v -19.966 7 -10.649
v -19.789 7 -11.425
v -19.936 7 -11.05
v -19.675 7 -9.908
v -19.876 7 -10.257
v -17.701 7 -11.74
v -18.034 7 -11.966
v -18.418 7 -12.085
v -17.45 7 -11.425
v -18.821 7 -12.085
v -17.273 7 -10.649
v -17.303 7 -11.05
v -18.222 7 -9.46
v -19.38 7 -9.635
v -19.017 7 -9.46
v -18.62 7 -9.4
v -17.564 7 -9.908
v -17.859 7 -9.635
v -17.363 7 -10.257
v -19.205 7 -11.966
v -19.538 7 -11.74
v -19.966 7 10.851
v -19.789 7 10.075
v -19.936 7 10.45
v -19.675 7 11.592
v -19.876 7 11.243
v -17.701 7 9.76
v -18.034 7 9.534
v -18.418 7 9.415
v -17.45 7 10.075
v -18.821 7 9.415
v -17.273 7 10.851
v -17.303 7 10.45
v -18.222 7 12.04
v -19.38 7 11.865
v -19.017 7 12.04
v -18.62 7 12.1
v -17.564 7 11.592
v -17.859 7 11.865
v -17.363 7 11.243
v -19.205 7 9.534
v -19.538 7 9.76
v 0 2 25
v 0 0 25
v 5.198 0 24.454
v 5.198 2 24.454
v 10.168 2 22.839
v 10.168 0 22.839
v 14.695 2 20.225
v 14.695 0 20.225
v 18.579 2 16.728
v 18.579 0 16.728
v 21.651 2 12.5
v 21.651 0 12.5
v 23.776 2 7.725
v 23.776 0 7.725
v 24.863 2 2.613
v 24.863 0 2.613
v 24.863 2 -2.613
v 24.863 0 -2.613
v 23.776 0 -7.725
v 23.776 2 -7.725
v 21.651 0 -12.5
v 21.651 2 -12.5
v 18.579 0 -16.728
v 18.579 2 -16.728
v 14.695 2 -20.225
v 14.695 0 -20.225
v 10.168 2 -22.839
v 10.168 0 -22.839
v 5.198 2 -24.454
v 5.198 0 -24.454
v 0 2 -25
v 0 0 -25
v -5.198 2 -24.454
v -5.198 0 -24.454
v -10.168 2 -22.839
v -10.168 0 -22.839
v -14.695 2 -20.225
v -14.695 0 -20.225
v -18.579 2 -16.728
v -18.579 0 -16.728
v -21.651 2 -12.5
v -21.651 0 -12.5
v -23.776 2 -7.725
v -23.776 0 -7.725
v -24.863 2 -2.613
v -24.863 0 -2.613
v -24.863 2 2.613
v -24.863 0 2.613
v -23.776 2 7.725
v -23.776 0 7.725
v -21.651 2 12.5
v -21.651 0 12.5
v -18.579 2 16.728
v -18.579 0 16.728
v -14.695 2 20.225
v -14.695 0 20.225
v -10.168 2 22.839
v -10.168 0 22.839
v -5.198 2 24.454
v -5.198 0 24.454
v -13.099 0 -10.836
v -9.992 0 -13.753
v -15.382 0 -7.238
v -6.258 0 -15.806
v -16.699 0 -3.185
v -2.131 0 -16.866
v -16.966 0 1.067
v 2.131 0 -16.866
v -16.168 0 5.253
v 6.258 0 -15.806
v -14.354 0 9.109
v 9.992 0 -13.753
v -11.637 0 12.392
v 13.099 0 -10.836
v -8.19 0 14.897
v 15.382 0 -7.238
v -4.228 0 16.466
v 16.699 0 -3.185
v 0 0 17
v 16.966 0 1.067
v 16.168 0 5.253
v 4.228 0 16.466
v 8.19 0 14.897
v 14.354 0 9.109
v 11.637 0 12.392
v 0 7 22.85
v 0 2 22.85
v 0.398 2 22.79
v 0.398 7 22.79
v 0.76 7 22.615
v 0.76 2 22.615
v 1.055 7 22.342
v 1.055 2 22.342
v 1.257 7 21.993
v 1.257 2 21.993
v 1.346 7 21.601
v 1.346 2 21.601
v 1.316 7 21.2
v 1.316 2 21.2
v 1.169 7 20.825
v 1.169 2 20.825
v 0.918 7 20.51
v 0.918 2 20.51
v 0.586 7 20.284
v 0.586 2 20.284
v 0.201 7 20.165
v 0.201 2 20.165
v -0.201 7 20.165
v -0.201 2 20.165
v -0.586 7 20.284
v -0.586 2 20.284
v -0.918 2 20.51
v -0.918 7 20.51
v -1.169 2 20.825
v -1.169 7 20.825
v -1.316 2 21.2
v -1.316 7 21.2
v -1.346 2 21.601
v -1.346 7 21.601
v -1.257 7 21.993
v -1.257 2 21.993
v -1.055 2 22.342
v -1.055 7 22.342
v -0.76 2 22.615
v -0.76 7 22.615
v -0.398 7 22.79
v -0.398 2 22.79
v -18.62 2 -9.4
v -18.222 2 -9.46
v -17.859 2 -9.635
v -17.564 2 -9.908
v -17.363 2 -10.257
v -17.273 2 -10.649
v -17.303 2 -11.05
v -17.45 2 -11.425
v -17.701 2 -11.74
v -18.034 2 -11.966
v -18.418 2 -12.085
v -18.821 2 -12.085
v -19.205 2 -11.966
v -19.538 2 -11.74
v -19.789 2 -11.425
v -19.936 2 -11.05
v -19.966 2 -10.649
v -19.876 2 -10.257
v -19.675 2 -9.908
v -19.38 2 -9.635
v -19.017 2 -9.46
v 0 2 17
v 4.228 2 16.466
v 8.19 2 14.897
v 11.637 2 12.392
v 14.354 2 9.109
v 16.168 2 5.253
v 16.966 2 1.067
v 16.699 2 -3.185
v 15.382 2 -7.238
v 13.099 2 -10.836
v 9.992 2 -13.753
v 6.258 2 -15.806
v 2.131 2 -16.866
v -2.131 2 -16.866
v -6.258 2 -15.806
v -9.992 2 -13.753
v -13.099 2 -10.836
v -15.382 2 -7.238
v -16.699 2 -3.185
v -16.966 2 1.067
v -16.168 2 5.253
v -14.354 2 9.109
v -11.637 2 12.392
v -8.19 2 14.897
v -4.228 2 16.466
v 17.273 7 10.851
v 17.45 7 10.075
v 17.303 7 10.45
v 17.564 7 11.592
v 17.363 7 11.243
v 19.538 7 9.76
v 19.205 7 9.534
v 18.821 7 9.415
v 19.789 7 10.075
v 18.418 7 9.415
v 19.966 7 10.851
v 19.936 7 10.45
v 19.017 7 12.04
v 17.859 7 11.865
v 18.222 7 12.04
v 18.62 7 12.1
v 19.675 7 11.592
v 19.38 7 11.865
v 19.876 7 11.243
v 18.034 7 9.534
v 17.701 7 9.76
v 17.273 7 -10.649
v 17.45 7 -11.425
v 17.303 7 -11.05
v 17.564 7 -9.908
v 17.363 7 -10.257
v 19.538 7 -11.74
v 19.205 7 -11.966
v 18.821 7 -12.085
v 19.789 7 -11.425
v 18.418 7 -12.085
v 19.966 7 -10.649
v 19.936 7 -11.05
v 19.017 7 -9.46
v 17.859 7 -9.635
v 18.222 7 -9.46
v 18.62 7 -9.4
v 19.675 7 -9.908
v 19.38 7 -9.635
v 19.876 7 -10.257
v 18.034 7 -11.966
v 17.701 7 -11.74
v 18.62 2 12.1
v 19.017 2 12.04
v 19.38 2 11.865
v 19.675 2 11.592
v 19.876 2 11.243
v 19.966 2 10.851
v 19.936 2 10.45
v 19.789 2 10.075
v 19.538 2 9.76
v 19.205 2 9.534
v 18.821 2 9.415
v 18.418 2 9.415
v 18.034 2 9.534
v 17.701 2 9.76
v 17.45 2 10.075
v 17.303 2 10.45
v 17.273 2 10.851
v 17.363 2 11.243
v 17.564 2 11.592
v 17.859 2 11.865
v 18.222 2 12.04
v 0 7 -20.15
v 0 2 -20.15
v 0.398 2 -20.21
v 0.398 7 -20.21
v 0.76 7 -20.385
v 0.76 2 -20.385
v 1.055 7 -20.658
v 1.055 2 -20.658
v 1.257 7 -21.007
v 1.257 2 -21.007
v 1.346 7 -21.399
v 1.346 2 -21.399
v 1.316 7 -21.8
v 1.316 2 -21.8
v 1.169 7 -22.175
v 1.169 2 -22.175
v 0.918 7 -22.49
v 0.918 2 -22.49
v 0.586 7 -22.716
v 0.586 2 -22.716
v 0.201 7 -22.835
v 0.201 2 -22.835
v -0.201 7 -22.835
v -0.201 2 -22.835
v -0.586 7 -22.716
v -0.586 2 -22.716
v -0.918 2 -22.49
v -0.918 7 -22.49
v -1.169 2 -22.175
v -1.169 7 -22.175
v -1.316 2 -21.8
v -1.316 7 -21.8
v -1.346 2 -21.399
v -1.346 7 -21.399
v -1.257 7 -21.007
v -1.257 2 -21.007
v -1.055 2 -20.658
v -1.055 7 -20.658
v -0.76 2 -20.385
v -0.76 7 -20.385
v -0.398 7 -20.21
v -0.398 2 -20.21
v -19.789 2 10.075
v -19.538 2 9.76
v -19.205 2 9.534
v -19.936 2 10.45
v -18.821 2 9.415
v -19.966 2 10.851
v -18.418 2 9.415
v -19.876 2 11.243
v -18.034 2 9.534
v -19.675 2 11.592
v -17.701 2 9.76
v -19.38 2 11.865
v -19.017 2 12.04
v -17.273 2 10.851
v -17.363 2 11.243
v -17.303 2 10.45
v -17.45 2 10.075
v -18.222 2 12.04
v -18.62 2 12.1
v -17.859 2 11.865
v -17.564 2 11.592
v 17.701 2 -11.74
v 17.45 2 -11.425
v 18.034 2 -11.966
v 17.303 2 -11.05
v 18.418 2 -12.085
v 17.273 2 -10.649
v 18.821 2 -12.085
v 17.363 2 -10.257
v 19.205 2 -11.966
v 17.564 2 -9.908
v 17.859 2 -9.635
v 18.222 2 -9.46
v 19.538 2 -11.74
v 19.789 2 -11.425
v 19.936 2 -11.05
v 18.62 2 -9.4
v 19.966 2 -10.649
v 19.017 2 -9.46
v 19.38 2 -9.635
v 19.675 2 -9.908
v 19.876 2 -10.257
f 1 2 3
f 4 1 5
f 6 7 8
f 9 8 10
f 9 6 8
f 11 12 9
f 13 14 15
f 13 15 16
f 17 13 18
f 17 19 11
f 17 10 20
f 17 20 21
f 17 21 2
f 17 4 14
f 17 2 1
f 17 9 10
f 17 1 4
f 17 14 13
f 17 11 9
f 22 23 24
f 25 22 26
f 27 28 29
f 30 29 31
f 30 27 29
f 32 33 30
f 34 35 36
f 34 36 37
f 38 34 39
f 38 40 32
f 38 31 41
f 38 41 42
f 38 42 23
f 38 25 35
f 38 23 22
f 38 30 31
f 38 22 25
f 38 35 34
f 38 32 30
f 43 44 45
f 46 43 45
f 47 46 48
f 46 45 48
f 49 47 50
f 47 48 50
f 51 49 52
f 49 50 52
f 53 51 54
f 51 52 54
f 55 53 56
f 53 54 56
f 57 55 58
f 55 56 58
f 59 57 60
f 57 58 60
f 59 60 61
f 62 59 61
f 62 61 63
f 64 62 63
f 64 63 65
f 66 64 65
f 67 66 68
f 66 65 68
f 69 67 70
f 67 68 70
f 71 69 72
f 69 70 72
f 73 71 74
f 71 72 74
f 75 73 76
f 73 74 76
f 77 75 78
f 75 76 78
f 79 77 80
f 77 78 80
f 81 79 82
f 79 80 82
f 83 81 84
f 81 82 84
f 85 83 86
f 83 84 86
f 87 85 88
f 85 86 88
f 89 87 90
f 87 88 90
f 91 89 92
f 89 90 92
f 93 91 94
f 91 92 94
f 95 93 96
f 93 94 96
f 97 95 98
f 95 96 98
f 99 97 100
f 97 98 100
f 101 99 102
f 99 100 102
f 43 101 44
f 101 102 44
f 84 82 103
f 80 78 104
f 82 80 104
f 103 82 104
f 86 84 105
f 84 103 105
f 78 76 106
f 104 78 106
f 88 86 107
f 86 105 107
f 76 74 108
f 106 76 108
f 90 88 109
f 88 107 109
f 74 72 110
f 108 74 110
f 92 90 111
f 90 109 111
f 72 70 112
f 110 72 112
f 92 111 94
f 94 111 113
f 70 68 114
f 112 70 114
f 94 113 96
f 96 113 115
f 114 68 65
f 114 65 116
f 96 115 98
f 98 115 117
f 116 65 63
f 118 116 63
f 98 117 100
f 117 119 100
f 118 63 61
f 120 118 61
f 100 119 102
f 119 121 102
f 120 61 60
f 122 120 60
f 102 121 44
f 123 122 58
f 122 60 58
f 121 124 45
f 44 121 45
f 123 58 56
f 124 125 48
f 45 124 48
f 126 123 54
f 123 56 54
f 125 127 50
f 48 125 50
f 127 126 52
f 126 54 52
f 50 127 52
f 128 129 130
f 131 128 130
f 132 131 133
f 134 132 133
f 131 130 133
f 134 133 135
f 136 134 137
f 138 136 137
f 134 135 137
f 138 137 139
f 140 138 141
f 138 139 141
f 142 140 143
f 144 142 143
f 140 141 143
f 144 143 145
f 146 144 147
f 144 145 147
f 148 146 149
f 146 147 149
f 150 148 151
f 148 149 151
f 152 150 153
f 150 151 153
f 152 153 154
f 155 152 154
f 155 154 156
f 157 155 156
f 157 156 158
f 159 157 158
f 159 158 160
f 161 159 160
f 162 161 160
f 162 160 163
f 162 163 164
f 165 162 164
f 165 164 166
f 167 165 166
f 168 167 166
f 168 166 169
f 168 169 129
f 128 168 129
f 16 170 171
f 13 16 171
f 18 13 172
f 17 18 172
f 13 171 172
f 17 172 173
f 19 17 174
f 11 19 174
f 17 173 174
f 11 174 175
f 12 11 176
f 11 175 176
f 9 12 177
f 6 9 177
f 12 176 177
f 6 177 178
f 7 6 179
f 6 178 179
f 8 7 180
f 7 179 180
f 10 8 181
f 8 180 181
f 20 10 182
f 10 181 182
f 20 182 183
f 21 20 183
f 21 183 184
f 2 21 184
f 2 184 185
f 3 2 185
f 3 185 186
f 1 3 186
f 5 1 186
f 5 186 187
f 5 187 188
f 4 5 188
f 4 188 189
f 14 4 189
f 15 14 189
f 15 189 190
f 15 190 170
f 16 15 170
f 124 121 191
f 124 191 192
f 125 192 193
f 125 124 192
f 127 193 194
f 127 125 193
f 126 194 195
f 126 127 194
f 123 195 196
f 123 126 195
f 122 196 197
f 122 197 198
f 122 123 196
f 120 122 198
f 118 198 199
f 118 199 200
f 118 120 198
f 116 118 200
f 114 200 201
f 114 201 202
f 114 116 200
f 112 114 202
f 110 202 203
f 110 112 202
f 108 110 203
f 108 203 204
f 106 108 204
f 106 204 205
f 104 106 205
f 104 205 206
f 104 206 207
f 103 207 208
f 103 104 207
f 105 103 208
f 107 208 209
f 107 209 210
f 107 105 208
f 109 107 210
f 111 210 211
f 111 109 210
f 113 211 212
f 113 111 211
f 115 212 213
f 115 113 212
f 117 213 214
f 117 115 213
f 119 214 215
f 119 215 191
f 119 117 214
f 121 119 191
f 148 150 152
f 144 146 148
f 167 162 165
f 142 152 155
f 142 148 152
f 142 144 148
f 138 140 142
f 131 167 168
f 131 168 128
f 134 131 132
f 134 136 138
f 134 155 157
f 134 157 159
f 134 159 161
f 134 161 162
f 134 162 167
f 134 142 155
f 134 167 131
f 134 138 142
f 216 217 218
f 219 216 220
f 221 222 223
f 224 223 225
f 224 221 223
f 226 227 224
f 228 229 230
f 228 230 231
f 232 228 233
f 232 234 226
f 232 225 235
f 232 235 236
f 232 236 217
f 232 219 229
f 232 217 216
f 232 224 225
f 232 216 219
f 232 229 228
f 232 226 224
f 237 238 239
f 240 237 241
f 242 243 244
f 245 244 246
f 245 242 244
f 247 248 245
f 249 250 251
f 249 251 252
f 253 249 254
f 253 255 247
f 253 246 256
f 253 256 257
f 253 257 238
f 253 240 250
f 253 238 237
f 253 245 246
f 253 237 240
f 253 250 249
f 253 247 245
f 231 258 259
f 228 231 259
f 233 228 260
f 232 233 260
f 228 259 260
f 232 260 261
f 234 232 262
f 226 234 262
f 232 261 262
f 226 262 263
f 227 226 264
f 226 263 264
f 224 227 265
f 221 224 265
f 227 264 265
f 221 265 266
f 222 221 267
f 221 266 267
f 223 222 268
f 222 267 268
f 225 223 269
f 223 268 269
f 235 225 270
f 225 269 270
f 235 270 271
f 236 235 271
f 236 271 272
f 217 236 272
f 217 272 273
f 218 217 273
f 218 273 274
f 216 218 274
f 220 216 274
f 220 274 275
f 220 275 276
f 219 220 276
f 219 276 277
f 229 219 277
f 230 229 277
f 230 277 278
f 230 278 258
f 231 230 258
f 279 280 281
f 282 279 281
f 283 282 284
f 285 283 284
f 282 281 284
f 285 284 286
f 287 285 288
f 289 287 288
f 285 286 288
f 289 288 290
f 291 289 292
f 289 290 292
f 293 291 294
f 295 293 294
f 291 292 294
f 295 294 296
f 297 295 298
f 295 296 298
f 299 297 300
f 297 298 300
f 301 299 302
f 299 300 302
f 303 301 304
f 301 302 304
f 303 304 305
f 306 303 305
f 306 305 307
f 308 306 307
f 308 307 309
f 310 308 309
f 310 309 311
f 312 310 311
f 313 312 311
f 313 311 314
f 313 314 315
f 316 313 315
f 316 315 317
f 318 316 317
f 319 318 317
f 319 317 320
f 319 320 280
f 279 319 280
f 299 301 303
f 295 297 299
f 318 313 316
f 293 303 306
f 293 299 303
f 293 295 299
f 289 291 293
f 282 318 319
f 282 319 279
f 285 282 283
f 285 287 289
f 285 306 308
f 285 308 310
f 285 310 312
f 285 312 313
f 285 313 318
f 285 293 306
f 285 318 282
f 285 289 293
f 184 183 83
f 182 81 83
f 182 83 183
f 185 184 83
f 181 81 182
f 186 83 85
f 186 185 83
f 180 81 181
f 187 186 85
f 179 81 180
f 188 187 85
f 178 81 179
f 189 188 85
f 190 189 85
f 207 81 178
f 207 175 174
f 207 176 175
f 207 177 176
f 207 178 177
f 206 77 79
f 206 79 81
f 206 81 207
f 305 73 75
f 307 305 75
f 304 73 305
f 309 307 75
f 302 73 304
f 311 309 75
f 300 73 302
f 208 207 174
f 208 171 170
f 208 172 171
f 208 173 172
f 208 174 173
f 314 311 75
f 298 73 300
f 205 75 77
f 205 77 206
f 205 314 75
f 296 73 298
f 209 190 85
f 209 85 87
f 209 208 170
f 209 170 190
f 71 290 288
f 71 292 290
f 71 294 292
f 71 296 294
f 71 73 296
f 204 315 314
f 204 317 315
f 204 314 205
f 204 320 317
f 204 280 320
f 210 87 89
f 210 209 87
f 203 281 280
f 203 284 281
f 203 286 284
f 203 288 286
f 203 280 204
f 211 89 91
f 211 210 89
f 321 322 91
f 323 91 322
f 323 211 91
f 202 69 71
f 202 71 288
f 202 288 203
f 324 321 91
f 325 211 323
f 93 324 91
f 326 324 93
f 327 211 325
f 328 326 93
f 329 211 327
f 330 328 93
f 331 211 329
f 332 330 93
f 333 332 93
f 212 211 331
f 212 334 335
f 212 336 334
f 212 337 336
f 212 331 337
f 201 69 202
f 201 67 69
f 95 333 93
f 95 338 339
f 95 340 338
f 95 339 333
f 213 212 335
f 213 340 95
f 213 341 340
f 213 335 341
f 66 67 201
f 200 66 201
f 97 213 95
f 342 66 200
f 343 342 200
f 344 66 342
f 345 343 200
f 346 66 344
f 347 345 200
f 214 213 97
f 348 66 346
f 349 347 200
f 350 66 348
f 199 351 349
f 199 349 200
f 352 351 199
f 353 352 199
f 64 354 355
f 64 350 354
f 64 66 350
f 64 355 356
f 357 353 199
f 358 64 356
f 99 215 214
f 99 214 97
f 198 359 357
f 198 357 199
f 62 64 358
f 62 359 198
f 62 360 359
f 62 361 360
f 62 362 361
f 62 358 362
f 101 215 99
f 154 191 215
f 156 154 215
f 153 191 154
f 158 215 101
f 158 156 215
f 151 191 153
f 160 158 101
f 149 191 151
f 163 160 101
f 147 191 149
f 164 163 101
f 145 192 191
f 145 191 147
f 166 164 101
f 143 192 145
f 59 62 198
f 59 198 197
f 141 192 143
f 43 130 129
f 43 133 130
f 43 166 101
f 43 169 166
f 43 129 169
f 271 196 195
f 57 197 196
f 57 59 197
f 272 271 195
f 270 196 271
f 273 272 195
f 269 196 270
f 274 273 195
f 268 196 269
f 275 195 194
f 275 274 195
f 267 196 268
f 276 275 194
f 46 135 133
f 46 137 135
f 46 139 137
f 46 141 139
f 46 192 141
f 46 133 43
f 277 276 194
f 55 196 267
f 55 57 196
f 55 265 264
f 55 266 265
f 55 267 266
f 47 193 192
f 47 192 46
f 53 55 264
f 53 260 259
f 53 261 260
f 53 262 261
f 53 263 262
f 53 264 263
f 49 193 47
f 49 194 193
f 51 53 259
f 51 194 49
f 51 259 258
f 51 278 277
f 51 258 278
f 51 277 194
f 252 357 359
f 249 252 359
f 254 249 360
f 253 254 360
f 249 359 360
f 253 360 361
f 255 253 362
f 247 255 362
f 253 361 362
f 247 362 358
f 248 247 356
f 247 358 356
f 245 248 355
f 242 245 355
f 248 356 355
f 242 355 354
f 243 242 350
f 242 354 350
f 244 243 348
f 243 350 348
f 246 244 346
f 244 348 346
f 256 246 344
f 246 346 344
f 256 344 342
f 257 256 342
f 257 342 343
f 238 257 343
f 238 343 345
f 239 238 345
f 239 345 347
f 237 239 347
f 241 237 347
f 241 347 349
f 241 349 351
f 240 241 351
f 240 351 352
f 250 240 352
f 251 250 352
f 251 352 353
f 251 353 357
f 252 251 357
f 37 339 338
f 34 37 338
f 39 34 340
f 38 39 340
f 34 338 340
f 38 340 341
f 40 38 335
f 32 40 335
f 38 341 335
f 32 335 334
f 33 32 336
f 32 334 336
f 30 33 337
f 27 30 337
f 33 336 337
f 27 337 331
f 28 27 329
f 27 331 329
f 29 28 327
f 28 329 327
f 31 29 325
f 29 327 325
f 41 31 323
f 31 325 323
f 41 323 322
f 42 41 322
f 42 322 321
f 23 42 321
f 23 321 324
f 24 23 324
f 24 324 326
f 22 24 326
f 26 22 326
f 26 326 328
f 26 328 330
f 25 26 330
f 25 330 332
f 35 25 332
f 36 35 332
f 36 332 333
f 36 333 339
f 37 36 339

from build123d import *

# Parameters (mm, degrees)
SKETCH1_R           = 25
SKETCH1_R_2         = 1.35
SKETCH1_R_3         = 17
BOSS_EXTRUDE1_DEPTH = 2
SKETCH1_3_R         = 1.35
BOSS_EXTRUDE2_DEPTH = 7


with BuildPart() as part:
    # Sketch1 → Boss-Extrude1 (new body)
    with BuildSketch(Plane(origin=(0, 0, 0), x_dir=(1, 0, 0), z_dir=(0, 1, 0))):
        Circle(SKETCH1_R)
        with Locations((0, 21.5)):
            Circle(SKETCH1_R_2, mode=Mode.SUBTRACT)
        with Locations((18.619546181, 10.75)):
            Circle(SKETCH1_R_2, mode=Mode.SUBTRACT)
        with Locations((18.619546181, -10.75)):
            Circle(SKETCH1_R_2, mode=Mode.SUBTRACT)
        with Locations((0, -21.5)):
            Circle(SKETCH1_R_2, mode=Mode.SUBTRACT)
        with Locations((-18.619546181, -10.75)):
            Circle(SKETCH1_R_2, mode=Mode.SUBTRACT)
        with Locations((-18.619546181, 10.75)):
            Circle(SKETCH1_R_2, mode=Mode.SUBTRACT)
        Circle(SKETCH1_R_3, mode=Mode.SUBTRACT)
    extrude(amount=BOSS_EXTRUDE1_DEPTH)

    # Sketch1<3> → Boss-Extrude2 (add)
    with BuildSketch(Plane(origin=(0, 0, 0), x_dir=(1, 0, 0), z_dir=(0, 1, 0))):
        with Locations((0, 21.5)):
            Circle(SKETCH1_3_R)
        with Locations((18.619546181, 10.75)):
            Circle(SKETCH1_3_R)
        with Locations((18.619546181, -10.75)):
            Circle(SKETCH1_3_R)
        with Locations((0, -21.5)):
            Circle(SKETCH1_3_R)
        with Locations((-18.619546181, -10.75)):
            Circle(SKETCH1_3_R)
        with Locations((-18.619546181, 10.75)):
            Circle(SKETCH1_3_R)
    extrude(amount=BOSS_EXTRUDE2_DEPTH)


solid = part.part
